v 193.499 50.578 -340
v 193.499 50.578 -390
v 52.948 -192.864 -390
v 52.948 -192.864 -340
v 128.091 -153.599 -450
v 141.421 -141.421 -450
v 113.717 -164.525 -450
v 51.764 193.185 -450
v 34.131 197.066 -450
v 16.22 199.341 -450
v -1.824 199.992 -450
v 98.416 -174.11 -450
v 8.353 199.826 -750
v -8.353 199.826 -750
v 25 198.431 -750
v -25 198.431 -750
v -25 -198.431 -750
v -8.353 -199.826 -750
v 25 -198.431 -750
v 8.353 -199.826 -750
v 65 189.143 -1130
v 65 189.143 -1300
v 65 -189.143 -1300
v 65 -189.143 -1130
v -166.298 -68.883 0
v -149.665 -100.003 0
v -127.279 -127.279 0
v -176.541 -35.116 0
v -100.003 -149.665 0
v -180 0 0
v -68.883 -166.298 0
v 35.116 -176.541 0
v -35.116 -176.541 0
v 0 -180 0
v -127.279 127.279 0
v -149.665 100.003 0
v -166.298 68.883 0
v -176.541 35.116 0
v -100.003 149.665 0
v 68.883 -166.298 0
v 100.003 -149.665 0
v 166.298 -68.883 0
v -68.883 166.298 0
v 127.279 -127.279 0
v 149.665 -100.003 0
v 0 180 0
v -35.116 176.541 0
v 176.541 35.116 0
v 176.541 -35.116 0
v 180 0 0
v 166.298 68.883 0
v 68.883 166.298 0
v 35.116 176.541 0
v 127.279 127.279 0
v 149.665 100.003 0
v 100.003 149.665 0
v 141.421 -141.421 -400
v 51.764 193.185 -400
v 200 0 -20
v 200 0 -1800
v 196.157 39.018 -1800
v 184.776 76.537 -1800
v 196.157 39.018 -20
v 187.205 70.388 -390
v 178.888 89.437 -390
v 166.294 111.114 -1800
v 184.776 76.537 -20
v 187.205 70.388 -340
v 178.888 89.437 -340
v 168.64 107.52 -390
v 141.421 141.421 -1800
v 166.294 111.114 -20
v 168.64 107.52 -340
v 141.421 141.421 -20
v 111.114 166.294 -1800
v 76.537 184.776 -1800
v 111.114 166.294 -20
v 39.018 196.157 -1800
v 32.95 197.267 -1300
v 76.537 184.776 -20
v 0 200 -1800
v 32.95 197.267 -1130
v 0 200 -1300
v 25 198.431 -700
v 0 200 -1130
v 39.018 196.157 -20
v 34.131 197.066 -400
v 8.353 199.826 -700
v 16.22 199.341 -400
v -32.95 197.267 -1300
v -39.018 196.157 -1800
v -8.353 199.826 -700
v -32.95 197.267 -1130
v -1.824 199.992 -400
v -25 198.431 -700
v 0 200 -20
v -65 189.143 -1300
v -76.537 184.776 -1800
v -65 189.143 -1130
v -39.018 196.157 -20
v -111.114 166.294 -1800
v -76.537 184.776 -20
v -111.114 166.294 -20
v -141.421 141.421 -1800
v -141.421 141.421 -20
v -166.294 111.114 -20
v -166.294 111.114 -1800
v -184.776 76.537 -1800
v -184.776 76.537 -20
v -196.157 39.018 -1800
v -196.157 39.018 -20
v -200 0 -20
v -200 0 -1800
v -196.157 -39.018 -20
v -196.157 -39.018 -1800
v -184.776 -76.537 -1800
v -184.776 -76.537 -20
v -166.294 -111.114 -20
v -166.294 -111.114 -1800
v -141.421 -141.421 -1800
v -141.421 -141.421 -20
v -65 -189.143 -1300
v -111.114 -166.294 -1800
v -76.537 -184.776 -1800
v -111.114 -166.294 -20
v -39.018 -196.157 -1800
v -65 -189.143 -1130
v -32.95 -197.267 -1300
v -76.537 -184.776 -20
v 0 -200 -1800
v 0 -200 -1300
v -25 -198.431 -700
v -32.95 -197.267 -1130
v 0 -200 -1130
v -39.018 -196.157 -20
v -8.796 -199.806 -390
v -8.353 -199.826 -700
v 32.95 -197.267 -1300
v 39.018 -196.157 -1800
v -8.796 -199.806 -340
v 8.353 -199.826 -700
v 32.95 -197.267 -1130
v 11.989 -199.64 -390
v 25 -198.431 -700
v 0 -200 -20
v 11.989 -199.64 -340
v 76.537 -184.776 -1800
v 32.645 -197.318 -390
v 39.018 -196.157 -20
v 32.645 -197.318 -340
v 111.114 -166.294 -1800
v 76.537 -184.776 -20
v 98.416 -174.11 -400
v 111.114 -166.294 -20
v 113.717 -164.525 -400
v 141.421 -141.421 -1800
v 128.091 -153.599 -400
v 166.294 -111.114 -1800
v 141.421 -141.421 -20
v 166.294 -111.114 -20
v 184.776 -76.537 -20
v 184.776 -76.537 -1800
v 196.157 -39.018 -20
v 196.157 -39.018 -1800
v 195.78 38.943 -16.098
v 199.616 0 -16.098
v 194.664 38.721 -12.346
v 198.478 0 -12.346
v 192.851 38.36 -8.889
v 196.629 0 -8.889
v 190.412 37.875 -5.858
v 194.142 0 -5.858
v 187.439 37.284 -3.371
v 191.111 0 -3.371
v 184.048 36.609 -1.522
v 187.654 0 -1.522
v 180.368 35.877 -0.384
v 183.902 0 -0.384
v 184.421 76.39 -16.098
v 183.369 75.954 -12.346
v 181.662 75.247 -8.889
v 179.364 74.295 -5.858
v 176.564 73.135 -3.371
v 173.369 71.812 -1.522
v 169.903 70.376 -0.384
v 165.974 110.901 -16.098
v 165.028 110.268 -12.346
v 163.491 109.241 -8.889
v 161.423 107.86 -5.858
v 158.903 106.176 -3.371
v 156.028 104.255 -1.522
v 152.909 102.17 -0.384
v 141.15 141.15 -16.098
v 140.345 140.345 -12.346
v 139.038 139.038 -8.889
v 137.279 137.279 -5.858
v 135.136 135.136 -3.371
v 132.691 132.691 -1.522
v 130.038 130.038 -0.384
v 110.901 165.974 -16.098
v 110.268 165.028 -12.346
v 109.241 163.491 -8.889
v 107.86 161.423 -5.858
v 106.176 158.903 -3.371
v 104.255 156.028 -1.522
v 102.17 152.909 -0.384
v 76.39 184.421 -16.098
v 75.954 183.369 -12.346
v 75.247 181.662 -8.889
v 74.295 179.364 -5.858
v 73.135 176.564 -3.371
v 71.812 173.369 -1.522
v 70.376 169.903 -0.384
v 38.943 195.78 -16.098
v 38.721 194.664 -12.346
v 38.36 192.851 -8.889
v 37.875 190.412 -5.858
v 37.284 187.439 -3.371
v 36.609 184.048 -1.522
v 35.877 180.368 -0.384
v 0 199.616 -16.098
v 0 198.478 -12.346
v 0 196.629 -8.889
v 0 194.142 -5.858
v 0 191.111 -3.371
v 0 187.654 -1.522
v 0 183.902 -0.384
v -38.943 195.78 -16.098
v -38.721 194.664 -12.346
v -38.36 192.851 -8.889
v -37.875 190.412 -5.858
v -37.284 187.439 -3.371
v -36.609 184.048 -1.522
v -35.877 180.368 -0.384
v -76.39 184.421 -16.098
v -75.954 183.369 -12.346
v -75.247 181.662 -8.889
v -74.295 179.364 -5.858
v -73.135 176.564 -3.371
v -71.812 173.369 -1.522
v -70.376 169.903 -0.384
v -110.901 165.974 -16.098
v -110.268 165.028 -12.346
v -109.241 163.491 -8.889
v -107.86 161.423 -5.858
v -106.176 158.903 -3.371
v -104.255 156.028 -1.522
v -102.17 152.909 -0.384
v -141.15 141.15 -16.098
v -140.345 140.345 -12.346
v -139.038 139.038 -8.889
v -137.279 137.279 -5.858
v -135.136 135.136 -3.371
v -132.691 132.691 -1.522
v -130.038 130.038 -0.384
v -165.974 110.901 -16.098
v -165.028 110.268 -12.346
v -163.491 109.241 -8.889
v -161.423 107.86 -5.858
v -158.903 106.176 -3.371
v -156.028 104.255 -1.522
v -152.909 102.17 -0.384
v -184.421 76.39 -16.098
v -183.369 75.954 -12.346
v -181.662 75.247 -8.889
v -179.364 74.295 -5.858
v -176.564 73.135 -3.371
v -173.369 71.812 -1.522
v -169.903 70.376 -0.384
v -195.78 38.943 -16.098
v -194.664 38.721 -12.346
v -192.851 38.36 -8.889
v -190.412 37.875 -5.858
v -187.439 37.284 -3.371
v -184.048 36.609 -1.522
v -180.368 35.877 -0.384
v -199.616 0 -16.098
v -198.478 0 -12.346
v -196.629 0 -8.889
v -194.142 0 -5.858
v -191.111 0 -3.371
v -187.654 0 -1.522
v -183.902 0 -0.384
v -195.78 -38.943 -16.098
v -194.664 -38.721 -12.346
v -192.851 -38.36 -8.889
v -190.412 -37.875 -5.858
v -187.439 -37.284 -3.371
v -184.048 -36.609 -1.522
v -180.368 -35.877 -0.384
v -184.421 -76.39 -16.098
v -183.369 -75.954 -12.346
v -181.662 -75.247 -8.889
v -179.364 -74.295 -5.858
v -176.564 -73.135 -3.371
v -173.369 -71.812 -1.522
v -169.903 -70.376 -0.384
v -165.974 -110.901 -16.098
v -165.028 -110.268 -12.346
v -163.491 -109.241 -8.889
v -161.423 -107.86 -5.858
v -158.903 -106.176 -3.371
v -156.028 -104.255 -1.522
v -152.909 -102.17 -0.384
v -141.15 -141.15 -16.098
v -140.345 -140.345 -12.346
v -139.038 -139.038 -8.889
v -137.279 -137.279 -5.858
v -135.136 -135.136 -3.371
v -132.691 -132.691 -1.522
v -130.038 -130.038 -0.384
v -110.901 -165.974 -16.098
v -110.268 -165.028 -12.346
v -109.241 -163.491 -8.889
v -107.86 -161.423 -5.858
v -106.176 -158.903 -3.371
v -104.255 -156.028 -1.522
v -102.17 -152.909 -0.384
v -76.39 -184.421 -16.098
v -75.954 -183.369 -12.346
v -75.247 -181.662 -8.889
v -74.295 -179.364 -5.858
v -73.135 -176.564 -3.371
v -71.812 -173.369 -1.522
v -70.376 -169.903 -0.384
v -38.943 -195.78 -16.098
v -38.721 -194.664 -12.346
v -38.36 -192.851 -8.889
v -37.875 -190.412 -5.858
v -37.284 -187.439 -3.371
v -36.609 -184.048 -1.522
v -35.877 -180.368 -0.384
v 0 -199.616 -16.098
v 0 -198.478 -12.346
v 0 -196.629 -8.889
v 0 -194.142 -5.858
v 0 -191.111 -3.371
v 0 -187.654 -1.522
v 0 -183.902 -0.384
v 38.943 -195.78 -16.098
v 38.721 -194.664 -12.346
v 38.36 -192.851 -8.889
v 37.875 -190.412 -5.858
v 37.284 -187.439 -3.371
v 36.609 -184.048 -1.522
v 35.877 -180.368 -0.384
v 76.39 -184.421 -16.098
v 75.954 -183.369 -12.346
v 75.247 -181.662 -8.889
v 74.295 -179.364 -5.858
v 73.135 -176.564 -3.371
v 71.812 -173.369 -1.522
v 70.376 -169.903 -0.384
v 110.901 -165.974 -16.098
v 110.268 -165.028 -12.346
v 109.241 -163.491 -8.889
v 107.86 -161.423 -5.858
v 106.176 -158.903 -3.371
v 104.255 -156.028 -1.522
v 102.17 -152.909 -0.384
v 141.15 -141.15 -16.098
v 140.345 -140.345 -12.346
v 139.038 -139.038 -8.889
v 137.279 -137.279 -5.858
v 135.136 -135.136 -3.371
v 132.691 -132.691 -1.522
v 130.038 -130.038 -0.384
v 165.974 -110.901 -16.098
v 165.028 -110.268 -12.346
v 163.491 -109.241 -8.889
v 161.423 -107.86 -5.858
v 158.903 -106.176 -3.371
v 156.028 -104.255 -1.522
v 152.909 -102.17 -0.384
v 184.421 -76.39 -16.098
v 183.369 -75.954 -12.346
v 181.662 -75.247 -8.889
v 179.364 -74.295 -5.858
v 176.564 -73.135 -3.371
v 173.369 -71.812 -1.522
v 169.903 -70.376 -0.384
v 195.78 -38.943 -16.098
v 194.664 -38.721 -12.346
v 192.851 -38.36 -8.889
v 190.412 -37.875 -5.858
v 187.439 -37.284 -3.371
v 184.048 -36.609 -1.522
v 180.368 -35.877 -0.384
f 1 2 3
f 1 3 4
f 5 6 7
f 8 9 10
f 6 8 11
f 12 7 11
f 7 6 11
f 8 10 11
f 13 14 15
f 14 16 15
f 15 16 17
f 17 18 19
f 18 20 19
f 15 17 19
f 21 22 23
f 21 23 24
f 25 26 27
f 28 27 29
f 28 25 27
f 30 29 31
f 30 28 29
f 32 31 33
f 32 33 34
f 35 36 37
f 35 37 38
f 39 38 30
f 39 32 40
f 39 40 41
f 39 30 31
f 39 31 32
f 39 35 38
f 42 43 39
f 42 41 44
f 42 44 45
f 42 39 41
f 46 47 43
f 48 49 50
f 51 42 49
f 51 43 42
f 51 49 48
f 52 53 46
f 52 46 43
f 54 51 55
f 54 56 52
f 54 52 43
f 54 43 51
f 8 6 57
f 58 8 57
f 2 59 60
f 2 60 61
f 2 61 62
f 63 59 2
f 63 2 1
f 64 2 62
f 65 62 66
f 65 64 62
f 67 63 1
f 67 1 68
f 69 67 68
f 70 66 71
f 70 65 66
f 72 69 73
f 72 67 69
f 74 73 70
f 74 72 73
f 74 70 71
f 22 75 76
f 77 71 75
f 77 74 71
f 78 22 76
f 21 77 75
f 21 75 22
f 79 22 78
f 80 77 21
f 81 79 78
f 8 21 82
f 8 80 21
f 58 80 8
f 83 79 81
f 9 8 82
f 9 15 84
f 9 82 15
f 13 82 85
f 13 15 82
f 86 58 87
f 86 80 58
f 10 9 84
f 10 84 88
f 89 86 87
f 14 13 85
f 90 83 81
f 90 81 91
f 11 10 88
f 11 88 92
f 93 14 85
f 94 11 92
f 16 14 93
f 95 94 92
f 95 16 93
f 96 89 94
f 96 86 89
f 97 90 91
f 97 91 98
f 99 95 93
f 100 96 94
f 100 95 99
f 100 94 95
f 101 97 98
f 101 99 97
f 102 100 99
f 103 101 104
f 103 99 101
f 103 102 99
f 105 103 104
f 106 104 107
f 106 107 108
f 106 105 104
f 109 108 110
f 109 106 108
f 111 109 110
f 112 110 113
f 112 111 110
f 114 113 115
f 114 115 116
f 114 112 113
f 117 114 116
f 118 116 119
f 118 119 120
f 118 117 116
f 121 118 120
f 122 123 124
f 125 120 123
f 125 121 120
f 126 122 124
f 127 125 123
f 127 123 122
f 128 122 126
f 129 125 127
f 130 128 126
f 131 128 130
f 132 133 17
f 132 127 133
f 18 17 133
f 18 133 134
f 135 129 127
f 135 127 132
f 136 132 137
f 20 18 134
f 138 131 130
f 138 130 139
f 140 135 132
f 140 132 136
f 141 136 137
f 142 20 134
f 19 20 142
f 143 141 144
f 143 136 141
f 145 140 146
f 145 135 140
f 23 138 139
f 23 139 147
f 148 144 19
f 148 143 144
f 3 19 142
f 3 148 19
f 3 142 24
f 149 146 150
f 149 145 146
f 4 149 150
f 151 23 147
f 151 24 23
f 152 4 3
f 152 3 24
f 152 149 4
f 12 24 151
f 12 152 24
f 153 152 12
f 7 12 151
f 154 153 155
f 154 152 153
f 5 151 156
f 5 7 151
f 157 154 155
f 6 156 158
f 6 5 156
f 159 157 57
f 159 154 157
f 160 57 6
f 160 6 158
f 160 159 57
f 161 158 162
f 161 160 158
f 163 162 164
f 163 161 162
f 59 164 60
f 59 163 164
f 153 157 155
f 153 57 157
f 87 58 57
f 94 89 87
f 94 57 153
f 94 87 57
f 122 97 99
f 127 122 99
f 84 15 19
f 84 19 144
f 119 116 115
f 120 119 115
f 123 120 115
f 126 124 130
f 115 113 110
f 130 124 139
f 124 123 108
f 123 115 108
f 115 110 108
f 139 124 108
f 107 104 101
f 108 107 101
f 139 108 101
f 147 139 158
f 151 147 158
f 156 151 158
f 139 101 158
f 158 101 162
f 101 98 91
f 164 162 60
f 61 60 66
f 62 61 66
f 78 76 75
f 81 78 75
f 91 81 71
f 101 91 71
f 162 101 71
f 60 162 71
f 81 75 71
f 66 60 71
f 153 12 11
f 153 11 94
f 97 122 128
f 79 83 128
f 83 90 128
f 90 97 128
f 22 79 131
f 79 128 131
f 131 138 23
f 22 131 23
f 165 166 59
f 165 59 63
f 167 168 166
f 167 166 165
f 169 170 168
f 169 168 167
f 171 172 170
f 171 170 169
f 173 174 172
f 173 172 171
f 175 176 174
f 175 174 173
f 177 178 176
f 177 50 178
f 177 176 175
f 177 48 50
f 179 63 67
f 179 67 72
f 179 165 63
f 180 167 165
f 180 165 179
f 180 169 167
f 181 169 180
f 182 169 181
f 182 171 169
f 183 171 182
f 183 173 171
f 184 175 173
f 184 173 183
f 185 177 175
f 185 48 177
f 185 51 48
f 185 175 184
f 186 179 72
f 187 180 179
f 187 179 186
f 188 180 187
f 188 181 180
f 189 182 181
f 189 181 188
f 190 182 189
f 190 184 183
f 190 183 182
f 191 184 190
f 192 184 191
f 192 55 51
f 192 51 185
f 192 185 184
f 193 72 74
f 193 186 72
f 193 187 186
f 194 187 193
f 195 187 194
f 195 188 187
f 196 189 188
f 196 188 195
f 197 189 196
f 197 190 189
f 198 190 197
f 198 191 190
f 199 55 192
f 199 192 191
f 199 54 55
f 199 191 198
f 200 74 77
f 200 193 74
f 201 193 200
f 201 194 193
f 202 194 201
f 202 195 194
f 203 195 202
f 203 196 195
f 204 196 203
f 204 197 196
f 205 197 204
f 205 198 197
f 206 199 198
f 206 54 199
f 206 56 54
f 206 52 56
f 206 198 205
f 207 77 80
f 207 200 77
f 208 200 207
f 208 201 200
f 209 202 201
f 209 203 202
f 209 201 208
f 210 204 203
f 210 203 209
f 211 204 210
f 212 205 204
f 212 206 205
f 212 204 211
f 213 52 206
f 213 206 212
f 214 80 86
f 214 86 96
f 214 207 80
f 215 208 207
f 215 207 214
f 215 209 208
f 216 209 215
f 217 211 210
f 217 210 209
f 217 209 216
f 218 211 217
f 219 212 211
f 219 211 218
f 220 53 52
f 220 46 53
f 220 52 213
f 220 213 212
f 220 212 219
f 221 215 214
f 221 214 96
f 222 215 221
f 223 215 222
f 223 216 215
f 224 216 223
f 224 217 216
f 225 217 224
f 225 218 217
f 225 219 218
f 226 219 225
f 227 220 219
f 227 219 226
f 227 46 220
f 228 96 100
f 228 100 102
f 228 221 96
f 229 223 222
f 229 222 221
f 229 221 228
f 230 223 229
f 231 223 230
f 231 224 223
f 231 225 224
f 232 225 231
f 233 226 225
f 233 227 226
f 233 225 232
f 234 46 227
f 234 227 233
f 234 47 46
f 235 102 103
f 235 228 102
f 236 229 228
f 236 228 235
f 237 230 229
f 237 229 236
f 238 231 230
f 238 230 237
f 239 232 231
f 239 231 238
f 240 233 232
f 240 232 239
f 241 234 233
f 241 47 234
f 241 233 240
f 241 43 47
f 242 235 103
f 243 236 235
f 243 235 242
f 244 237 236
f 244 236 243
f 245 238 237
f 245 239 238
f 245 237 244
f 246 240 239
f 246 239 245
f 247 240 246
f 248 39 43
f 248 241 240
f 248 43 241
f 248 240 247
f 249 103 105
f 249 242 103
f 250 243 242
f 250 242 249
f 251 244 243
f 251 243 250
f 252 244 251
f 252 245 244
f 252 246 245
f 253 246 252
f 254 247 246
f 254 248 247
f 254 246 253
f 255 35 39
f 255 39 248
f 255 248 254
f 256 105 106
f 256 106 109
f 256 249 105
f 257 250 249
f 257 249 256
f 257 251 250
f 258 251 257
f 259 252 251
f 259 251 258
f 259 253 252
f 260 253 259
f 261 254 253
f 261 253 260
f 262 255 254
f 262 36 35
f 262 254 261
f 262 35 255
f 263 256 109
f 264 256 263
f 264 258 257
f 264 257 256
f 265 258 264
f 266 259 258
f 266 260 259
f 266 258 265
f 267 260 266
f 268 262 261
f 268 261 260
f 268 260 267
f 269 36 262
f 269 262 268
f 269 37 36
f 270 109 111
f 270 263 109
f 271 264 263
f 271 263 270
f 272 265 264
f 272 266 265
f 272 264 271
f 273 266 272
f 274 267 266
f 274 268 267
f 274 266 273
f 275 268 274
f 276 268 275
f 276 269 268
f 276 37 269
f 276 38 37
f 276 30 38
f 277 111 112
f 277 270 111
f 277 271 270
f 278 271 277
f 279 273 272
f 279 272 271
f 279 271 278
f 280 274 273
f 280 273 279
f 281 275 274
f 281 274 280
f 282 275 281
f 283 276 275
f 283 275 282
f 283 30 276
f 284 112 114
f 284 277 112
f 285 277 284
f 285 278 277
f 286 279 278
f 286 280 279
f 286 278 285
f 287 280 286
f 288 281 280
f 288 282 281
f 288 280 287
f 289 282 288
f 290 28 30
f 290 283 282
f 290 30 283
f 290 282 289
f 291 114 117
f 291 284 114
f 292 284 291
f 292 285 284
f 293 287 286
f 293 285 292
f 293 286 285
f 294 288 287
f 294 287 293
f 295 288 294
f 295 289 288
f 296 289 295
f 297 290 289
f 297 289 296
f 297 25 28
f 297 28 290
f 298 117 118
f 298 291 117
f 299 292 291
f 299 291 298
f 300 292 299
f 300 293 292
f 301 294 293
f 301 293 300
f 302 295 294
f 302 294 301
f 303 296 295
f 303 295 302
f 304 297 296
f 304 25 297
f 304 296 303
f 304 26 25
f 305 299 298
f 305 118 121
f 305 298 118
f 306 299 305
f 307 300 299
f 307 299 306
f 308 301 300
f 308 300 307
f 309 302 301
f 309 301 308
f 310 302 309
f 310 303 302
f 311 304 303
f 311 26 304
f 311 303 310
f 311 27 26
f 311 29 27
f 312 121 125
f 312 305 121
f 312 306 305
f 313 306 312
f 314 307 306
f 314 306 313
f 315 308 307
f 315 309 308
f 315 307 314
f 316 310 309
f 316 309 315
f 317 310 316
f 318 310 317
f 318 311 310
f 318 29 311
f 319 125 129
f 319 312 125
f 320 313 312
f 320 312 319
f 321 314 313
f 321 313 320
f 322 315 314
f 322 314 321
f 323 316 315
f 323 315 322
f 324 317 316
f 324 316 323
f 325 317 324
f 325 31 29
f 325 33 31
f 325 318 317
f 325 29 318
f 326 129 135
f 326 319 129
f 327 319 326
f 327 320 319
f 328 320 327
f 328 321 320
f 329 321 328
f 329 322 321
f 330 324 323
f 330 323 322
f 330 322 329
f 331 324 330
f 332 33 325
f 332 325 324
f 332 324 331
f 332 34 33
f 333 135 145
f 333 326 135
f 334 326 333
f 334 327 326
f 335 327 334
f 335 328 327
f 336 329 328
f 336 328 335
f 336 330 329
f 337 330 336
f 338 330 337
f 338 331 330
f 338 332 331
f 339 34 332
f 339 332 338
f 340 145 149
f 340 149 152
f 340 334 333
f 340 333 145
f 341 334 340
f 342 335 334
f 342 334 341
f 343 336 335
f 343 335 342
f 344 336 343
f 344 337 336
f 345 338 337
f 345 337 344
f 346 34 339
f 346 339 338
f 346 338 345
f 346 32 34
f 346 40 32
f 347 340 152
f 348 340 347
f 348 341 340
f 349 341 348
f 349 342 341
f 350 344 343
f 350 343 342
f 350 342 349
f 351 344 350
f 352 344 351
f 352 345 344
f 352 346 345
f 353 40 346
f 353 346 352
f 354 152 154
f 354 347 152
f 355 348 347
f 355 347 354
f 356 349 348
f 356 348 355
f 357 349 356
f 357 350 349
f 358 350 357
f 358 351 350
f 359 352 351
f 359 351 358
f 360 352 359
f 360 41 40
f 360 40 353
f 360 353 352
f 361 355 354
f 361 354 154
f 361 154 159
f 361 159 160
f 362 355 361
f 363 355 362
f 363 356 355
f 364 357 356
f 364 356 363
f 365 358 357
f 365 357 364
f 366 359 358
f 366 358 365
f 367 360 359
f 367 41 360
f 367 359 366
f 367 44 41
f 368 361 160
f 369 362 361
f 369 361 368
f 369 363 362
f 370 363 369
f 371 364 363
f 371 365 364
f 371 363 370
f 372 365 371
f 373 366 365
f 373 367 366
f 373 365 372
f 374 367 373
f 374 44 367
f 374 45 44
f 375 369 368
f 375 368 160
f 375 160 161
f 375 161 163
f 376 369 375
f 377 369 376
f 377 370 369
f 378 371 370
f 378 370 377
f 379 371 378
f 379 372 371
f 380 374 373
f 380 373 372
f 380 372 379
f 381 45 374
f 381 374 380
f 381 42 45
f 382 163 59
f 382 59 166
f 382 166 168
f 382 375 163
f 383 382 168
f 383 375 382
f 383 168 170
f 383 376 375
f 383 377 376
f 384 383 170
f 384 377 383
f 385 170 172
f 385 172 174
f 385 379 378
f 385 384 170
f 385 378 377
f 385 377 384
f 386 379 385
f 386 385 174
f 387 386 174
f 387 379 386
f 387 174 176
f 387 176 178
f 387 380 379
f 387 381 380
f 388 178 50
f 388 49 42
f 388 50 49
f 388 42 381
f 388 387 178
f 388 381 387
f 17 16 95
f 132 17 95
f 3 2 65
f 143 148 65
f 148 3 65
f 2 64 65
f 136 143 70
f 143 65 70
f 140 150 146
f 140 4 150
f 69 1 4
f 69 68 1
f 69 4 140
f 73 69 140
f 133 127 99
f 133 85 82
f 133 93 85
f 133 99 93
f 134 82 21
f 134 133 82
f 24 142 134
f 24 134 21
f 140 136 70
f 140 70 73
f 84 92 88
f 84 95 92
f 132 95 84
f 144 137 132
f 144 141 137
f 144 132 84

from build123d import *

# Parameters (mm, degrees)
F0_R      = 200
F1_DEPTH  = 1800
F2_W      = 130
F2_H      = 170
F3_DEPTH  = 500
F4_W      = 50
F4_H      = 50
F5_DEPTH  = 500
F8_W      = 50
F8_H      = 50
F9_DEPTH  = 500
F11_W     = 50
F11_H     = 50
F12_DEPTH = 500
F13_R     = 20


with BuildPart() as f1:
    # F0 (on Top) → F1 (new body)
    with BuildSketch(Plane.XY):
        Circle(F0_R)
    extrude(amount=-F1_DEPTH)

    # F2 (on Front) → F3 (cut, symmetric)
    with BuildSketch(Plane.XZ):
        with Locations((0, -1215)):
            Rectangle(F2_W, F2_H)
    extrude(amount=F3_DEPTH, both=True, mode=Mode.SUBTRACT)

    # F4 (on Front) → F5 (cut, symmetric)
    with BuildSketch(Plane.XZ):
        with Locations((0, -725)):
            Rectangle(F4_W, F4_H)
    extrude(amount=F5_DEPTH, both=True, mode=Mode.SUBTRACT)

    # F8 (on face) → F9 (cut, symmetric)
    with BuildSketch(Plane(origin=(0, 0, 0), x_dir=(-0.965926, -0.258819, 0), z_dir=(-0.258819, 0.965926, 0))):
        with Locations((-75, -425)):
            Rectangle(F8_W, F8_H)
    extrude(amount=F9_DEPTH, both=True, mode=Mode.SUBTRACT)

    # F11 (on face) → F12 (cut, symmetric)
    with BuildSketch(Plane(origin=(0, 0, 0), x_dir=(-0.866025, 0.5, 0), z_dir=(0.5, 0.866025, 0))):
        with Locations((-117.285978, -365)):
            Rectangle(F11_W, F11_H)
    extrude(amount=F12_DEPTH, both=True, mode=Mode.SUBTRACT)

    # F13
    f13_edges = [f1.edges().sort_by_distance(p)[0] for p in [
        (-200, 0, 0),
    ]]
    fillet(f13_edges, radius=F13_R)


solid = f1.part
